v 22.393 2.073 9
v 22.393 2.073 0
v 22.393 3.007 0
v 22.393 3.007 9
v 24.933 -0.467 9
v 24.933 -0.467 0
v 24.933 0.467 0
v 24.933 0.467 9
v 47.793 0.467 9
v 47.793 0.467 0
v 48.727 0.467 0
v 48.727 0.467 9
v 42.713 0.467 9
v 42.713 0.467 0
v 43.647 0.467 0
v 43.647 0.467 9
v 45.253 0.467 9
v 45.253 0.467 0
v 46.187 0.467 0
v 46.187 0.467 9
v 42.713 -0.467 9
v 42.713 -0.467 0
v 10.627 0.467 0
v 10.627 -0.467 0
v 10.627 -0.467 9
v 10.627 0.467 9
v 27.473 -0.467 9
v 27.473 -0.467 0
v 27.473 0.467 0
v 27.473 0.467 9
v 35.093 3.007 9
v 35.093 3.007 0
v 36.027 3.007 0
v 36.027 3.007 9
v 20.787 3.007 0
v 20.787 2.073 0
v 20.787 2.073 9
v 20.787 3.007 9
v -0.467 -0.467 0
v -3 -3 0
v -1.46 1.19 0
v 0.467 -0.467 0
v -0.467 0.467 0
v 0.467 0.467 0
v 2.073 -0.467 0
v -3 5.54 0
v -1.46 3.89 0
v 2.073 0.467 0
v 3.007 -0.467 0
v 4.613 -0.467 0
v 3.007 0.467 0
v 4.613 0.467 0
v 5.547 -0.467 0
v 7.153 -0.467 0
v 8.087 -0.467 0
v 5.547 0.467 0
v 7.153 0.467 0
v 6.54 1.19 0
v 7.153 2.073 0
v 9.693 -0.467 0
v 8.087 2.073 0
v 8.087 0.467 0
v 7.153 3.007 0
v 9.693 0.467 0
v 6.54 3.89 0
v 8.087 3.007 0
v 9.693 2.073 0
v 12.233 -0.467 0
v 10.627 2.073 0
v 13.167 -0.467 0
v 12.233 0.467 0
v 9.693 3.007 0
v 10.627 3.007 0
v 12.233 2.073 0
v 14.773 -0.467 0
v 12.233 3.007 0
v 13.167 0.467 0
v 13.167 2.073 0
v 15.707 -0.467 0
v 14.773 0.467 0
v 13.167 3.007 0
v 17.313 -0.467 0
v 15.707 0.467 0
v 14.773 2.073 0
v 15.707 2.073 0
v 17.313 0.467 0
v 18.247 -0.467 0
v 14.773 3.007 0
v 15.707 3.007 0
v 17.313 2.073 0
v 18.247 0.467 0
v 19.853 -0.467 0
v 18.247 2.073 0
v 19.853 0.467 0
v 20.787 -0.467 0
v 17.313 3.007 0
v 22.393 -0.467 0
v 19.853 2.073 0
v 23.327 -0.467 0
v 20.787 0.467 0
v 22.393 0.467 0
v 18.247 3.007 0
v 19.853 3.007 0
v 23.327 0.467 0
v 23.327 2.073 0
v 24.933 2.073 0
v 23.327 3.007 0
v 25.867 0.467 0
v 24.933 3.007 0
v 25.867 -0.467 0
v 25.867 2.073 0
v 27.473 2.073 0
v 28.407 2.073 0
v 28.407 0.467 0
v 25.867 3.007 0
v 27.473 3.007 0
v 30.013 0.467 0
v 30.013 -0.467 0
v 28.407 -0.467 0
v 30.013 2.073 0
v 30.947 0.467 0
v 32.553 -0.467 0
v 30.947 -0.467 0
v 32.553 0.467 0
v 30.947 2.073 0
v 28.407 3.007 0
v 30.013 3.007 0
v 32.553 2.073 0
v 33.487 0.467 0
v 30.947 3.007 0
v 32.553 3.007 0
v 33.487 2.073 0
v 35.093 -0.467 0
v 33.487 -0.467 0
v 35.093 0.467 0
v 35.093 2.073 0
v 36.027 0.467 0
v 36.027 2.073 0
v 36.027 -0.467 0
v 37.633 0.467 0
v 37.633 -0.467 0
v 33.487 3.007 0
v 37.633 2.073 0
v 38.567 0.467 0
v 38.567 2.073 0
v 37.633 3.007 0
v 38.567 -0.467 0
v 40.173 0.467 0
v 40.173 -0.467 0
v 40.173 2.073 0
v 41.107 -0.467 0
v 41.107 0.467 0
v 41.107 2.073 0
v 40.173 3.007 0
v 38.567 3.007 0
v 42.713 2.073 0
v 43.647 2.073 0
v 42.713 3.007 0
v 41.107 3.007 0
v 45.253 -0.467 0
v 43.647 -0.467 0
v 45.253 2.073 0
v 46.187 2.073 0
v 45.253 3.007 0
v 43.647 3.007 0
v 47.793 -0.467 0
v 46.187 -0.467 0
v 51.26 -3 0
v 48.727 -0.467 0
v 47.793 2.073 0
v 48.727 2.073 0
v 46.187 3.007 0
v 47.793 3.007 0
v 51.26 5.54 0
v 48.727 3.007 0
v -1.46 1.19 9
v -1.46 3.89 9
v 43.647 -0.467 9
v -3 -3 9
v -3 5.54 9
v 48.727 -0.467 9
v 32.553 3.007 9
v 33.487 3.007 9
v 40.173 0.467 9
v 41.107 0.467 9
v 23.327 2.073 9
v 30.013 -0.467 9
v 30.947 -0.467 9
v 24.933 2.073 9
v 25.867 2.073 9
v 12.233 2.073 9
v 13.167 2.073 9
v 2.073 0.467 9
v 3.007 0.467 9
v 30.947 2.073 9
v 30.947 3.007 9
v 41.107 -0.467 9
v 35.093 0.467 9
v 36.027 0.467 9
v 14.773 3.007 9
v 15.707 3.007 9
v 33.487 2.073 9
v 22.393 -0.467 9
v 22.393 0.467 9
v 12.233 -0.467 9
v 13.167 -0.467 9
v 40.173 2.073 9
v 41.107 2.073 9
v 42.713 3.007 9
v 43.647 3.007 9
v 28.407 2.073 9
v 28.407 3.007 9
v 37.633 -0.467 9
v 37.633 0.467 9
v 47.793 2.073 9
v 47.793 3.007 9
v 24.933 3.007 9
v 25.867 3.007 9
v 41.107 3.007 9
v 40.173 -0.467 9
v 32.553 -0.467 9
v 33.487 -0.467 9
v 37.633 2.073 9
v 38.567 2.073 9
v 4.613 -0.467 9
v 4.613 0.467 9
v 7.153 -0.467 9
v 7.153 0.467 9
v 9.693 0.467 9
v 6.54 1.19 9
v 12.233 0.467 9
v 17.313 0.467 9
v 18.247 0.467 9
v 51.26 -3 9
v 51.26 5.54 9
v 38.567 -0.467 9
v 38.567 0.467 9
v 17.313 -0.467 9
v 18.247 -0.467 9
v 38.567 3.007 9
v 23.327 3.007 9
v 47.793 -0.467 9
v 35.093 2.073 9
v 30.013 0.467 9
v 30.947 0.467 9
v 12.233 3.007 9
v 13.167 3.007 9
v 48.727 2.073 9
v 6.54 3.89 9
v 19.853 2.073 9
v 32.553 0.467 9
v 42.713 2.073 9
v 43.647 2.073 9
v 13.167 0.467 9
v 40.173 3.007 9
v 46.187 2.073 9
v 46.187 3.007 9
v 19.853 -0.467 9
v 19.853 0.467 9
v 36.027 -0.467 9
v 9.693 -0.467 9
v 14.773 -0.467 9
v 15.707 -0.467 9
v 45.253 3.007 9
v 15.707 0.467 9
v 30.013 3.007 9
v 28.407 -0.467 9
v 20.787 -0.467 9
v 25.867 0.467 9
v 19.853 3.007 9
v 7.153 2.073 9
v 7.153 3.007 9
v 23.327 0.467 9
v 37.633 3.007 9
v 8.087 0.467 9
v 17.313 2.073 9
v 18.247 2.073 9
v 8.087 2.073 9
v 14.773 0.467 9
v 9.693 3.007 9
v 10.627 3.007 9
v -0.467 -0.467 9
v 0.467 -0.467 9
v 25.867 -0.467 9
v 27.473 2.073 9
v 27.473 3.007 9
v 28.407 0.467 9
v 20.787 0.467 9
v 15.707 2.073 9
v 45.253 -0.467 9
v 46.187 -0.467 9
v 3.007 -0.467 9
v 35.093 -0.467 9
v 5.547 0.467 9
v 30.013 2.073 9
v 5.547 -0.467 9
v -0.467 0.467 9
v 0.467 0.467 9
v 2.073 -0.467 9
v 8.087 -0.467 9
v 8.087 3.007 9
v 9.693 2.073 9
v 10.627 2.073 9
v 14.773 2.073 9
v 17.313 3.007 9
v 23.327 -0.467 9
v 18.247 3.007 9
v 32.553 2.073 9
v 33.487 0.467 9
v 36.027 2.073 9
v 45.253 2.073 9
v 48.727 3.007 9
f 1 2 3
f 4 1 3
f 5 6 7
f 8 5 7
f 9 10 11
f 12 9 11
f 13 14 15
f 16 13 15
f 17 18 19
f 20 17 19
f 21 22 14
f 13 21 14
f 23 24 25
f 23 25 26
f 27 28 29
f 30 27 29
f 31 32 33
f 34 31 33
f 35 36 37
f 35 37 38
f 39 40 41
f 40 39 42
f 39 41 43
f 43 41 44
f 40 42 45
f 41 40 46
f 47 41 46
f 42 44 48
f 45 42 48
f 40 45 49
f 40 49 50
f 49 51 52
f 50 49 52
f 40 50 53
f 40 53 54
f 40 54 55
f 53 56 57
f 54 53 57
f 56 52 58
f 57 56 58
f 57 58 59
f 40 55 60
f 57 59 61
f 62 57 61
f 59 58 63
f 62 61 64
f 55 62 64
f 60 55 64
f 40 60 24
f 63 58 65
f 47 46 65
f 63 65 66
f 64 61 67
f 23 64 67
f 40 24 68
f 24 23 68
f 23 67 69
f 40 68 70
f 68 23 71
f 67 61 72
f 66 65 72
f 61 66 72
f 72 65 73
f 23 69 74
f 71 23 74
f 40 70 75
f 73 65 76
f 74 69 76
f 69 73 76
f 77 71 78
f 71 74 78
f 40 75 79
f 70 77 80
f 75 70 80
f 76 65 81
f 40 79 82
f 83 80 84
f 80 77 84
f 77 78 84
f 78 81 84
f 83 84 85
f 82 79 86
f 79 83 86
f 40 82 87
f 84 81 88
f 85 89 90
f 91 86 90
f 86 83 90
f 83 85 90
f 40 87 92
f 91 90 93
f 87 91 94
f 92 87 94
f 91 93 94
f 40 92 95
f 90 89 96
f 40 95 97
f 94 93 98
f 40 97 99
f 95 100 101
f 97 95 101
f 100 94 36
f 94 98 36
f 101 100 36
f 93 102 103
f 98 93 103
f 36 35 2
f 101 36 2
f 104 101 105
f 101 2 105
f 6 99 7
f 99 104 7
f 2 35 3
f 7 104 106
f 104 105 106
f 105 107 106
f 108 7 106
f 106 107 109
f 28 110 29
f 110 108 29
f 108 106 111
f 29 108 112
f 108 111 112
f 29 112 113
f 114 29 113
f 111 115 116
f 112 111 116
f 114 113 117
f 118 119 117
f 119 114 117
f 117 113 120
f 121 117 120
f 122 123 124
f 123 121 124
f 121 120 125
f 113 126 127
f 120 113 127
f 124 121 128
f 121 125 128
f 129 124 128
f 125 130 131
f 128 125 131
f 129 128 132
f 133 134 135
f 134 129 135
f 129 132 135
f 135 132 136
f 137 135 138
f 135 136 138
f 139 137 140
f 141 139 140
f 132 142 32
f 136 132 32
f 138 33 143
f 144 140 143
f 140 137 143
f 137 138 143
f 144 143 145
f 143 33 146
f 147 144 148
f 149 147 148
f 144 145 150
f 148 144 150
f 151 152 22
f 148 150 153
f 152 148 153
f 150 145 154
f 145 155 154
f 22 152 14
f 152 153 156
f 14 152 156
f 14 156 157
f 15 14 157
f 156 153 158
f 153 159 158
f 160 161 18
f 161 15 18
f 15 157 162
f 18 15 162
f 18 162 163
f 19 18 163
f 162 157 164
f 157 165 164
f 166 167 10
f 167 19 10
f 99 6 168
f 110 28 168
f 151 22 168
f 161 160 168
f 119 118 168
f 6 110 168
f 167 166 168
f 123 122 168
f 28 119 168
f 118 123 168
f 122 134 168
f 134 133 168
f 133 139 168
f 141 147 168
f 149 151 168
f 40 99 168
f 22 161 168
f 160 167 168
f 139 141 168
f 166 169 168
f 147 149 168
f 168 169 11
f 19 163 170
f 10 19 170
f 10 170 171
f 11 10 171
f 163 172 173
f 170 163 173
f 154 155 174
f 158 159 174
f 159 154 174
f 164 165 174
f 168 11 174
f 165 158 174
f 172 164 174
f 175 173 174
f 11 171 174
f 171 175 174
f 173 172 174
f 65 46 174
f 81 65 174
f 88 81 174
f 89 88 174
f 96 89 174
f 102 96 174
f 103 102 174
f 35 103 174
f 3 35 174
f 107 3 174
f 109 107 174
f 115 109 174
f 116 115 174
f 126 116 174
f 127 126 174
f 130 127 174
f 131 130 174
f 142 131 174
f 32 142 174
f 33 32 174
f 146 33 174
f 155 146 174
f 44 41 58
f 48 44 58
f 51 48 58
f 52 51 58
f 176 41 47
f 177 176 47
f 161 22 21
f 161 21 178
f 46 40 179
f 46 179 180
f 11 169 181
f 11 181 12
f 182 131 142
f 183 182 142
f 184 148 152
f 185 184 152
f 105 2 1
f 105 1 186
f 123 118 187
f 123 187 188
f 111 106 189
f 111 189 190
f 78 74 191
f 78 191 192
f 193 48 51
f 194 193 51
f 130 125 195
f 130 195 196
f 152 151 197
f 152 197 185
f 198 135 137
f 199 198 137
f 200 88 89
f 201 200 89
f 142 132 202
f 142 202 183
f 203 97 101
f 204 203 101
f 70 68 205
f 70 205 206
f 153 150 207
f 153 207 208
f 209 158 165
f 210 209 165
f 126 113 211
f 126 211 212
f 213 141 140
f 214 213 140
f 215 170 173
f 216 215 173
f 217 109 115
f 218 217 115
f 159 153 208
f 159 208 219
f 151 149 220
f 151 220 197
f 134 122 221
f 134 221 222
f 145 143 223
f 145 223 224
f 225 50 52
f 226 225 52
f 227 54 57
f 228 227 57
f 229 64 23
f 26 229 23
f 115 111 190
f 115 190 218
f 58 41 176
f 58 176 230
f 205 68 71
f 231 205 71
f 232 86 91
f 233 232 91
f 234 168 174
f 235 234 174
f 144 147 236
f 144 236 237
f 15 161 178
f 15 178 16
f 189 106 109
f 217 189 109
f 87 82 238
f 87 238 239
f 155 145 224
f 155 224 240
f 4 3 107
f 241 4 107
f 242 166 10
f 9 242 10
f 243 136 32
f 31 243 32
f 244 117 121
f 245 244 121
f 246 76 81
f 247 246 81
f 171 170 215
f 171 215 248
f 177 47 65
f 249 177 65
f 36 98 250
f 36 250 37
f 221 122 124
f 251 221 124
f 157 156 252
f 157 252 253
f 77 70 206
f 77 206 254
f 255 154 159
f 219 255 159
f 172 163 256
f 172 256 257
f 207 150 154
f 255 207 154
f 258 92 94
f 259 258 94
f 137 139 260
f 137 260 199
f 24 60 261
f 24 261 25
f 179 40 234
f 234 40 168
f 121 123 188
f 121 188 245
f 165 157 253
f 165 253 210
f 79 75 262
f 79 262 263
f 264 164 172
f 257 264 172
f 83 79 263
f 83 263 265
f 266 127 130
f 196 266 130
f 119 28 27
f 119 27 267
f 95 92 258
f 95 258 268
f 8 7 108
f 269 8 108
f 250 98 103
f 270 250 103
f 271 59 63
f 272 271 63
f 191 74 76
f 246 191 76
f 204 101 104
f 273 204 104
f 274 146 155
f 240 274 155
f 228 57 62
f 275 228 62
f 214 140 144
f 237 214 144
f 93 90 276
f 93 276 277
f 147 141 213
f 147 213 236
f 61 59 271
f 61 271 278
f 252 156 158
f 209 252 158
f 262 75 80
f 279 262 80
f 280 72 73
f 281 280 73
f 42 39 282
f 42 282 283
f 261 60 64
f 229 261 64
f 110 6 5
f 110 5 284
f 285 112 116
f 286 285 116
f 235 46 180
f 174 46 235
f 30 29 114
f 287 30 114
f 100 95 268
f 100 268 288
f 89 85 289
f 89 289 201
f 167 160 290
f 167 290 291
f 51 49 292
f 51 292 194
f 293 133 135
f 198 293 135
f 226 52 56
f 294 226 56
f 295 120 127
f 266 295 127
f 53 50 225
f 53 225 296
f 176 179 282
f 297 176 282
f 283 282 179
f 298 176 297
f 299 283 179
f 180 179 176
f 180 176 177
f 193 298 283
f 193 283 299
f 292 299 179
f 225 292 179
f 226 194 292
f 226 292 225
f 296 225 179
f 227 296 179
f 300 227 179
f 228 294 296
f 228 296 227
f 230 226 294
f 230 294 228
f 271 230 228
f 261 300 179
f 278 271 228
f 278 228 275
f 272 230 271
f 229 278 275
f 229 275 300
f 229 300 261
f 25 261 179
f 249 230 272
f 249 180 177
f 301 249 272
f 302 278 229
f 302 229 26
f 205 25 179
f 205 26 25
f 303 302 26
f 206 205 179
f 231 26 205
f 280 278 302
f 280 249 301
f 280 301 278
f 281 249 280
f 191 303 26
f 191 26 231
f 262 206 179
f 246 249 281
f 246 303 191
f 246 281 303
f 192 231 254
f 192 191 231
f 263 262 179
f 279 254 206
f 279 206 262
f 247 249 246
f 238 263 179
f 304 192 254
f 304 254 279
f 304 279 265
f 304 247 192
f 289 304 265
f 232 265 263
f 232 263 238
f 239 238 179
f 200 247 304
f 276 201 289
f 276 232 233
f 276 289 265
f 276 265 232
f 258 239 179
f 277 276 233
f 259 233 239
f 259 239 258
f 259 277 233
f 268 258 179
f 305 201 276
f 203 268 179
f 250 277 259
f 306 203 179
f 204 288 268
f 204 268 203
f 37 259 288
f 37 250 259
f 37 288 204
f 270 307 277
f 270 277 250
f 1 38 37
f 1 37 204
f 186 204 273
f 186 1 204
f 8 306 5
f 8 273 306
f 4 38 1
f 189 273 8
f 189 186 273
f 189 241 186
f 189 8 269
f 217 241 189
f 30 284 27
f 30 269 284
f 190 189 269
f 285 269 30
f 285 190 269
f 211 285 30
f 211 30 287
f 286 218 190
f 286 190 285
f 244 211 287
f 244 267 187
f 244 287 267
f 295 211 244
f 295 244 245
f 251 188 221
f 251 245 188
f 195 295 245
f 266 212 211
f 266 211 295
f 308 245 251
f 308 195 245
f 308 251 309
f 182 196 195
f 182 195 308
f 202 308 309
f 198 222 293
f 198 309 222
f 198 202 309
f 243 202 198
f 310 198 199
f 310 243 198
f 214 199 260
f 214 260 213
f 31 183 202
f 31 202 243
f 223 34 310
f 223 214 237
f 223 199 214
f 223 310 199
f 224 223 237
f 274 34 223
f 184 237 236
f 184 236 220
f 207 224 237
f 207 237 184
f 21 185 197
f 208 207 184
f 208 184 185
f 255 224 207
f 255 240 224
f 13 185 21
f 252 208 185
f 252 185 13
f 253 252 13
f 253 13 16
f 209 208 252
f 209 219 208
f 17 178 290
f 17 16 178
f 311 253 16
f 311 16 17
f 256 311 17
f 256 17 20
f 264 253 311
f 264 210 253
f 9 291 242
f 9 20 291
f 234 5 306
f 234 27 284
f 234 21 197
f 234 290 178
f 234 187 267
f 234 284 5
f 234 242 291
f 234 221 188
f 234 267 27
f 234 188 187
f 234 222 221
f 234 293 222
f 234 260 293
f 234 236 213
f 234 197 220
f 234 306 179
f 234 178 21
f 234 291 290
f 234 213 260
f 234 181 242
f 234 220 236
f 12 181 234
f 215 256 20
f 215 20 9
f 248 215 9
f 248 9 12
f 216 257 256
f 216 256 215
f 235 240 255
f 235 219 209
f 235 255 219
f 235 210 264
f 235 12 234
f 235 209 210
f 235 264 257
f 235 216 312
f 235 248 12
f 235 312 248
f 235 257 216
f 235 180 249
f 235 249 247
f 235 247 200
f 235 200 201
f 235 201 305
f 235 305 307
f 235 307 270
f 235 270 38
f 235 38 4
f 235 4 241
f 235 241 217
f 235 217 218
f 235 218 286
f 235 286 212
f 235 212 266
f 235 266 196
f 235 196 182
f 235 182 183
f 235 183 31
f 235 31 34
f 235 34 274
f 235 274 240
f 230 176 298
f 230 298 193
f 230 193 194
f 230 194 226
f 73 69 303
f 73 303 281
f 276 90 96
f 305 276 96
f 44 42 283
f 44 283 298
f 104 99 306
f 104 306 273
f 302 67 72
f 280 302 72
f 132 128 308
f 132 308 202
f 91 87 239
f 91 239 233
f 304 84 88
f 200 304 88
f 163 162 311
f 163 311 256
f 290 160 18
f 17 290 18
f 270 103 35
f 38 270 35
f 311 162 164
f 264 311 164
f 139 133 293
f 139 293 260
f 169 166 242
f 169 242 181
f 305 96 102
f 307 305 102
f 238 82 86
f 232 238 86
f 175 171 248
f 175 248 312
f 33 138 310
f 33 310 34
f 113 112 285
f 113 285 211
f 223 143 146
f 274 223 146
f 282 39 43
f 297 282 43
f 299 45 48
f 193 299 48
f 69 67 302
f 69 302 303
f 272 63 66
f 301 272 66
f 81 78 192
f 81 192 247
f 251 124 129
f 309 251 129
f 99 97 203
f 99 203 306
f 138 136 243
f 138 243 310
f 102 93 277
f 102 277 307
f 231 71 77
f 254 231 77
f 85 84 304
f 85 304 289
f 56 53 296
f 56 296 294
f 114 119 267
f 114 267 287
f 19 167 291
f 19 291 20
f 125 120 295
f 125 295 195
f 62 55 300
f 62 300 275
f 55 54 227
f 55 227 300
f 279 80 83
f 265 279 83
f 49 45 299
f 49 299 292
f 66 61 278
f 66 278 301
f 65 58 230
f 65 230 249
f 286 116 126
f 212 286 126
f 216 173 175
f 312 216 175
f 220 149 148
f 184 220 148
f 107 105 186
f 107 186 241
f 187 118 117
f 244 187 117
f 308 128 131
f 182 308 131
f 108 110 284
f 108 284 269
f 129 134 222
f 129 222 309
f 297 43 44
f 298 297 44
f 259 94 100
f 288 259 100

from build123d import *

# Parameters (mm, degrees)
F0_W     = 54.26
F0_H     = 8.54
F0_W_2   = 0.93338
F0_H_2   = 0.93338
F1_DEPTH = 9
F2_W     = 8
F2_H     = 2.7
F3_DEPTH = 25


with BuildPart() as f1:
    # F0 (on Top) → F1 (new body)
    with BuildSketch(Plane.XY):
        with Locations((24.13, 1.27)):
            Rectangle(F0_W, F0_H)
        Rectangle(F0_W_2, F0_H_2, mode=Mode.SUBTRACT)
        with Locations((2.54, 0)):
            Rectangle(F0_W_2, F0_H_2, mode=Mode.SUBTRACT)
        with Locations((5.08, 0)):
            Rectangle(F0_W_2, F0_H_2, mode=Mode.SUBTRACT)
        with Locations((7.62, 0)):
            Rectangle(F0_W_2, F0_H_2, mode=Mode.SUBTRACT)
        with Locations((10.16, 0)):
            Rectangle(F0_W_2, F0_H_2, mode=Mode.SUBTRACT)
        with Locations((12.7, 0)):
            Rectangle(F0_W_2, F0_H_2, mode=Mode.SUBTRACT)
        with Locations((15.24, 0)):
            Rectangle(F0_W_2, F0_H_2, mode=Mode.SUBTRACT)
        with Locations((17.78, 0)):
            Rectangle(F0_W_2, F0_H_2, mode=Mode.SUBTRACT)
        with Locations((20.32, 0)):
            Rectangle(F0_W_2, F0_H_2, mode=Mode.SUBTRACT)
        with Locations((22.86, 0)):
            Rectangle(F0_W_2, F0_H_2, mode=Mode.SUBTRACT)
        with Locations((25.4, 0)):
            Rectangle(F0_W_2, F0_H_2, mode=Mode.SUBTRACT)
        with Locations((27.94, 0)):
            Rectangle(F0_W_2, F0_H_2, mode=Mode.SUBTRACT)
        with Locations((30.48, 0)):
            Rectangle(F0_W_2, F0_H_2, mode=Mode.SUBTRACT)
        with Locations((33.02, 0)):
            Rectangle(F0_W_2, F0_H_2, mode=Mode.SUBTRACT)
        with Locations((35.56, 0)):
            Rectangle(F0_W_2, F0_H_2, mode=Mode.SUBTRACT)
        with Locations((38.1, 0)):
            Rectangle(F0_W_2, F0_H_2, mode=Mode.SUBTRACT)
        with Locations((40.64, 0)):
            Rectangle(F0_W_2, F0_H_2, mode=Mode.SUBTRACT)
        with Locations((43.18, 0)):
            Rectangle(F0_W_2, F0_H_2, mode=Mode.SUBTRACT)
        with Locations((45.72, 0)):
            Rectangle(F0_W_2, F0_H_2, mode=Mode.SUBTRACT)
        with Locations((48.26, 0)):
            Rectangle(F0_W_2, F0_H_2, mode=Mode.SUBTRACT)
        with Locations((0, 2.54)):
            Rectangle(F0_W_2, F0_H_2, mode=Mode.SUBTRACT)
        with Locations((2.54, 2.54)):
            Rectangle(F0_W_2, F0_H_2, mode=Mode.SUBTRACT)
        with Locations((5.08, 2.54)):
            Rectangle(F0_W_2, F0_H_2, mode=Mode.SUBTRACT)
        with Locations((7.62, 2.54)):
            Rectangle(F0_W_2, F0_H_2, mode=Mode.SUBTRACT)
        with Locations((10.16, 2.54)):
            Rectangle(F0_W_2, F0_H_2, mode=Mode.SUBTRACT)
        with Locations((12.7, 2.54)):
            Rectangle(F0_W_2, F0_H_2, mode=Mode.SUBTRACT)
        with Locations((15.24, 2.54)):
            Rectangle(F0_W_2, F0_H_2, mode=Mode.SUBTRACT)
        with Locations((17.78, 2.54)):
            Rectangle(F0_W_2, F0_H_2, mode=Mode.SUBTRACT)
        with Locations((20.32, 2.54)):
            Rectangle(F0_W_2, F0_H_2, mode=Mode.SUBTRACT)
        with Locations((22.86, 2.54)):
            Rectangle(F0_W_2, F0_H_2, mode=Mode.SUBTRACT)
        with Locations((25.4, 2.54)):
            Rectangle(F0_W_2, F0_H_2, mode=Mode.SUBTRACT)
        with Locations((27.94, 2.54)):
            Rectangle(F0_W_2, F0_H_2, mode=Mode.SUBTRACT)
        with Locations((30.48, 2.54)):
            Rectangle(F0_W_2, F0_H_2, mode=Mode.SUBTRACT)
        with Locations((33.02, 2.54)):
            Rectangle(F0_W_2, F0_H_2, mode=Mode.SUBTRACT)
        with Locations((35.56, 2.54)):
            Rectangle(F0_W_2, F0_H_2, mode=Mode.SUBTRACT)
        with Locations((38.1, 2.54)):
            Rectangle(F0_W_2, F0_H_2, mode=Mode.SUBTRACT)
        with Locations((40.64, 2.54)):
            Rectangle(F0_W_2, F0_H_2, mode=Mode.SUBTRACT)
        with Locations((43.18, 2.54)):
            Rectangle(F0_W_2, F0_H_2, mode=Mode.SUBTRACT)
        with Locations((45.72, 2.54)):
            Rectangle(F0_W_2, F0_H_2, mode=Mode.SUBTRACT)
        with Locations((48.26, 2.54)):
            Rectangle(F0_W_2, F0_H_2, mode=Mode.SUBTRACT)
    extrude(amount=F1_DEPTH)

    # F2 (on Top) → F3 (cut)
    with BuildSketch(Plane.XY):
        with Locations((2.54, 2.54)):
            Rectangle(F2_W, F2_H)
    extrude(amount=F3_DEPTH, mode=Mode.SUBTRACT)


solid = f1.part
